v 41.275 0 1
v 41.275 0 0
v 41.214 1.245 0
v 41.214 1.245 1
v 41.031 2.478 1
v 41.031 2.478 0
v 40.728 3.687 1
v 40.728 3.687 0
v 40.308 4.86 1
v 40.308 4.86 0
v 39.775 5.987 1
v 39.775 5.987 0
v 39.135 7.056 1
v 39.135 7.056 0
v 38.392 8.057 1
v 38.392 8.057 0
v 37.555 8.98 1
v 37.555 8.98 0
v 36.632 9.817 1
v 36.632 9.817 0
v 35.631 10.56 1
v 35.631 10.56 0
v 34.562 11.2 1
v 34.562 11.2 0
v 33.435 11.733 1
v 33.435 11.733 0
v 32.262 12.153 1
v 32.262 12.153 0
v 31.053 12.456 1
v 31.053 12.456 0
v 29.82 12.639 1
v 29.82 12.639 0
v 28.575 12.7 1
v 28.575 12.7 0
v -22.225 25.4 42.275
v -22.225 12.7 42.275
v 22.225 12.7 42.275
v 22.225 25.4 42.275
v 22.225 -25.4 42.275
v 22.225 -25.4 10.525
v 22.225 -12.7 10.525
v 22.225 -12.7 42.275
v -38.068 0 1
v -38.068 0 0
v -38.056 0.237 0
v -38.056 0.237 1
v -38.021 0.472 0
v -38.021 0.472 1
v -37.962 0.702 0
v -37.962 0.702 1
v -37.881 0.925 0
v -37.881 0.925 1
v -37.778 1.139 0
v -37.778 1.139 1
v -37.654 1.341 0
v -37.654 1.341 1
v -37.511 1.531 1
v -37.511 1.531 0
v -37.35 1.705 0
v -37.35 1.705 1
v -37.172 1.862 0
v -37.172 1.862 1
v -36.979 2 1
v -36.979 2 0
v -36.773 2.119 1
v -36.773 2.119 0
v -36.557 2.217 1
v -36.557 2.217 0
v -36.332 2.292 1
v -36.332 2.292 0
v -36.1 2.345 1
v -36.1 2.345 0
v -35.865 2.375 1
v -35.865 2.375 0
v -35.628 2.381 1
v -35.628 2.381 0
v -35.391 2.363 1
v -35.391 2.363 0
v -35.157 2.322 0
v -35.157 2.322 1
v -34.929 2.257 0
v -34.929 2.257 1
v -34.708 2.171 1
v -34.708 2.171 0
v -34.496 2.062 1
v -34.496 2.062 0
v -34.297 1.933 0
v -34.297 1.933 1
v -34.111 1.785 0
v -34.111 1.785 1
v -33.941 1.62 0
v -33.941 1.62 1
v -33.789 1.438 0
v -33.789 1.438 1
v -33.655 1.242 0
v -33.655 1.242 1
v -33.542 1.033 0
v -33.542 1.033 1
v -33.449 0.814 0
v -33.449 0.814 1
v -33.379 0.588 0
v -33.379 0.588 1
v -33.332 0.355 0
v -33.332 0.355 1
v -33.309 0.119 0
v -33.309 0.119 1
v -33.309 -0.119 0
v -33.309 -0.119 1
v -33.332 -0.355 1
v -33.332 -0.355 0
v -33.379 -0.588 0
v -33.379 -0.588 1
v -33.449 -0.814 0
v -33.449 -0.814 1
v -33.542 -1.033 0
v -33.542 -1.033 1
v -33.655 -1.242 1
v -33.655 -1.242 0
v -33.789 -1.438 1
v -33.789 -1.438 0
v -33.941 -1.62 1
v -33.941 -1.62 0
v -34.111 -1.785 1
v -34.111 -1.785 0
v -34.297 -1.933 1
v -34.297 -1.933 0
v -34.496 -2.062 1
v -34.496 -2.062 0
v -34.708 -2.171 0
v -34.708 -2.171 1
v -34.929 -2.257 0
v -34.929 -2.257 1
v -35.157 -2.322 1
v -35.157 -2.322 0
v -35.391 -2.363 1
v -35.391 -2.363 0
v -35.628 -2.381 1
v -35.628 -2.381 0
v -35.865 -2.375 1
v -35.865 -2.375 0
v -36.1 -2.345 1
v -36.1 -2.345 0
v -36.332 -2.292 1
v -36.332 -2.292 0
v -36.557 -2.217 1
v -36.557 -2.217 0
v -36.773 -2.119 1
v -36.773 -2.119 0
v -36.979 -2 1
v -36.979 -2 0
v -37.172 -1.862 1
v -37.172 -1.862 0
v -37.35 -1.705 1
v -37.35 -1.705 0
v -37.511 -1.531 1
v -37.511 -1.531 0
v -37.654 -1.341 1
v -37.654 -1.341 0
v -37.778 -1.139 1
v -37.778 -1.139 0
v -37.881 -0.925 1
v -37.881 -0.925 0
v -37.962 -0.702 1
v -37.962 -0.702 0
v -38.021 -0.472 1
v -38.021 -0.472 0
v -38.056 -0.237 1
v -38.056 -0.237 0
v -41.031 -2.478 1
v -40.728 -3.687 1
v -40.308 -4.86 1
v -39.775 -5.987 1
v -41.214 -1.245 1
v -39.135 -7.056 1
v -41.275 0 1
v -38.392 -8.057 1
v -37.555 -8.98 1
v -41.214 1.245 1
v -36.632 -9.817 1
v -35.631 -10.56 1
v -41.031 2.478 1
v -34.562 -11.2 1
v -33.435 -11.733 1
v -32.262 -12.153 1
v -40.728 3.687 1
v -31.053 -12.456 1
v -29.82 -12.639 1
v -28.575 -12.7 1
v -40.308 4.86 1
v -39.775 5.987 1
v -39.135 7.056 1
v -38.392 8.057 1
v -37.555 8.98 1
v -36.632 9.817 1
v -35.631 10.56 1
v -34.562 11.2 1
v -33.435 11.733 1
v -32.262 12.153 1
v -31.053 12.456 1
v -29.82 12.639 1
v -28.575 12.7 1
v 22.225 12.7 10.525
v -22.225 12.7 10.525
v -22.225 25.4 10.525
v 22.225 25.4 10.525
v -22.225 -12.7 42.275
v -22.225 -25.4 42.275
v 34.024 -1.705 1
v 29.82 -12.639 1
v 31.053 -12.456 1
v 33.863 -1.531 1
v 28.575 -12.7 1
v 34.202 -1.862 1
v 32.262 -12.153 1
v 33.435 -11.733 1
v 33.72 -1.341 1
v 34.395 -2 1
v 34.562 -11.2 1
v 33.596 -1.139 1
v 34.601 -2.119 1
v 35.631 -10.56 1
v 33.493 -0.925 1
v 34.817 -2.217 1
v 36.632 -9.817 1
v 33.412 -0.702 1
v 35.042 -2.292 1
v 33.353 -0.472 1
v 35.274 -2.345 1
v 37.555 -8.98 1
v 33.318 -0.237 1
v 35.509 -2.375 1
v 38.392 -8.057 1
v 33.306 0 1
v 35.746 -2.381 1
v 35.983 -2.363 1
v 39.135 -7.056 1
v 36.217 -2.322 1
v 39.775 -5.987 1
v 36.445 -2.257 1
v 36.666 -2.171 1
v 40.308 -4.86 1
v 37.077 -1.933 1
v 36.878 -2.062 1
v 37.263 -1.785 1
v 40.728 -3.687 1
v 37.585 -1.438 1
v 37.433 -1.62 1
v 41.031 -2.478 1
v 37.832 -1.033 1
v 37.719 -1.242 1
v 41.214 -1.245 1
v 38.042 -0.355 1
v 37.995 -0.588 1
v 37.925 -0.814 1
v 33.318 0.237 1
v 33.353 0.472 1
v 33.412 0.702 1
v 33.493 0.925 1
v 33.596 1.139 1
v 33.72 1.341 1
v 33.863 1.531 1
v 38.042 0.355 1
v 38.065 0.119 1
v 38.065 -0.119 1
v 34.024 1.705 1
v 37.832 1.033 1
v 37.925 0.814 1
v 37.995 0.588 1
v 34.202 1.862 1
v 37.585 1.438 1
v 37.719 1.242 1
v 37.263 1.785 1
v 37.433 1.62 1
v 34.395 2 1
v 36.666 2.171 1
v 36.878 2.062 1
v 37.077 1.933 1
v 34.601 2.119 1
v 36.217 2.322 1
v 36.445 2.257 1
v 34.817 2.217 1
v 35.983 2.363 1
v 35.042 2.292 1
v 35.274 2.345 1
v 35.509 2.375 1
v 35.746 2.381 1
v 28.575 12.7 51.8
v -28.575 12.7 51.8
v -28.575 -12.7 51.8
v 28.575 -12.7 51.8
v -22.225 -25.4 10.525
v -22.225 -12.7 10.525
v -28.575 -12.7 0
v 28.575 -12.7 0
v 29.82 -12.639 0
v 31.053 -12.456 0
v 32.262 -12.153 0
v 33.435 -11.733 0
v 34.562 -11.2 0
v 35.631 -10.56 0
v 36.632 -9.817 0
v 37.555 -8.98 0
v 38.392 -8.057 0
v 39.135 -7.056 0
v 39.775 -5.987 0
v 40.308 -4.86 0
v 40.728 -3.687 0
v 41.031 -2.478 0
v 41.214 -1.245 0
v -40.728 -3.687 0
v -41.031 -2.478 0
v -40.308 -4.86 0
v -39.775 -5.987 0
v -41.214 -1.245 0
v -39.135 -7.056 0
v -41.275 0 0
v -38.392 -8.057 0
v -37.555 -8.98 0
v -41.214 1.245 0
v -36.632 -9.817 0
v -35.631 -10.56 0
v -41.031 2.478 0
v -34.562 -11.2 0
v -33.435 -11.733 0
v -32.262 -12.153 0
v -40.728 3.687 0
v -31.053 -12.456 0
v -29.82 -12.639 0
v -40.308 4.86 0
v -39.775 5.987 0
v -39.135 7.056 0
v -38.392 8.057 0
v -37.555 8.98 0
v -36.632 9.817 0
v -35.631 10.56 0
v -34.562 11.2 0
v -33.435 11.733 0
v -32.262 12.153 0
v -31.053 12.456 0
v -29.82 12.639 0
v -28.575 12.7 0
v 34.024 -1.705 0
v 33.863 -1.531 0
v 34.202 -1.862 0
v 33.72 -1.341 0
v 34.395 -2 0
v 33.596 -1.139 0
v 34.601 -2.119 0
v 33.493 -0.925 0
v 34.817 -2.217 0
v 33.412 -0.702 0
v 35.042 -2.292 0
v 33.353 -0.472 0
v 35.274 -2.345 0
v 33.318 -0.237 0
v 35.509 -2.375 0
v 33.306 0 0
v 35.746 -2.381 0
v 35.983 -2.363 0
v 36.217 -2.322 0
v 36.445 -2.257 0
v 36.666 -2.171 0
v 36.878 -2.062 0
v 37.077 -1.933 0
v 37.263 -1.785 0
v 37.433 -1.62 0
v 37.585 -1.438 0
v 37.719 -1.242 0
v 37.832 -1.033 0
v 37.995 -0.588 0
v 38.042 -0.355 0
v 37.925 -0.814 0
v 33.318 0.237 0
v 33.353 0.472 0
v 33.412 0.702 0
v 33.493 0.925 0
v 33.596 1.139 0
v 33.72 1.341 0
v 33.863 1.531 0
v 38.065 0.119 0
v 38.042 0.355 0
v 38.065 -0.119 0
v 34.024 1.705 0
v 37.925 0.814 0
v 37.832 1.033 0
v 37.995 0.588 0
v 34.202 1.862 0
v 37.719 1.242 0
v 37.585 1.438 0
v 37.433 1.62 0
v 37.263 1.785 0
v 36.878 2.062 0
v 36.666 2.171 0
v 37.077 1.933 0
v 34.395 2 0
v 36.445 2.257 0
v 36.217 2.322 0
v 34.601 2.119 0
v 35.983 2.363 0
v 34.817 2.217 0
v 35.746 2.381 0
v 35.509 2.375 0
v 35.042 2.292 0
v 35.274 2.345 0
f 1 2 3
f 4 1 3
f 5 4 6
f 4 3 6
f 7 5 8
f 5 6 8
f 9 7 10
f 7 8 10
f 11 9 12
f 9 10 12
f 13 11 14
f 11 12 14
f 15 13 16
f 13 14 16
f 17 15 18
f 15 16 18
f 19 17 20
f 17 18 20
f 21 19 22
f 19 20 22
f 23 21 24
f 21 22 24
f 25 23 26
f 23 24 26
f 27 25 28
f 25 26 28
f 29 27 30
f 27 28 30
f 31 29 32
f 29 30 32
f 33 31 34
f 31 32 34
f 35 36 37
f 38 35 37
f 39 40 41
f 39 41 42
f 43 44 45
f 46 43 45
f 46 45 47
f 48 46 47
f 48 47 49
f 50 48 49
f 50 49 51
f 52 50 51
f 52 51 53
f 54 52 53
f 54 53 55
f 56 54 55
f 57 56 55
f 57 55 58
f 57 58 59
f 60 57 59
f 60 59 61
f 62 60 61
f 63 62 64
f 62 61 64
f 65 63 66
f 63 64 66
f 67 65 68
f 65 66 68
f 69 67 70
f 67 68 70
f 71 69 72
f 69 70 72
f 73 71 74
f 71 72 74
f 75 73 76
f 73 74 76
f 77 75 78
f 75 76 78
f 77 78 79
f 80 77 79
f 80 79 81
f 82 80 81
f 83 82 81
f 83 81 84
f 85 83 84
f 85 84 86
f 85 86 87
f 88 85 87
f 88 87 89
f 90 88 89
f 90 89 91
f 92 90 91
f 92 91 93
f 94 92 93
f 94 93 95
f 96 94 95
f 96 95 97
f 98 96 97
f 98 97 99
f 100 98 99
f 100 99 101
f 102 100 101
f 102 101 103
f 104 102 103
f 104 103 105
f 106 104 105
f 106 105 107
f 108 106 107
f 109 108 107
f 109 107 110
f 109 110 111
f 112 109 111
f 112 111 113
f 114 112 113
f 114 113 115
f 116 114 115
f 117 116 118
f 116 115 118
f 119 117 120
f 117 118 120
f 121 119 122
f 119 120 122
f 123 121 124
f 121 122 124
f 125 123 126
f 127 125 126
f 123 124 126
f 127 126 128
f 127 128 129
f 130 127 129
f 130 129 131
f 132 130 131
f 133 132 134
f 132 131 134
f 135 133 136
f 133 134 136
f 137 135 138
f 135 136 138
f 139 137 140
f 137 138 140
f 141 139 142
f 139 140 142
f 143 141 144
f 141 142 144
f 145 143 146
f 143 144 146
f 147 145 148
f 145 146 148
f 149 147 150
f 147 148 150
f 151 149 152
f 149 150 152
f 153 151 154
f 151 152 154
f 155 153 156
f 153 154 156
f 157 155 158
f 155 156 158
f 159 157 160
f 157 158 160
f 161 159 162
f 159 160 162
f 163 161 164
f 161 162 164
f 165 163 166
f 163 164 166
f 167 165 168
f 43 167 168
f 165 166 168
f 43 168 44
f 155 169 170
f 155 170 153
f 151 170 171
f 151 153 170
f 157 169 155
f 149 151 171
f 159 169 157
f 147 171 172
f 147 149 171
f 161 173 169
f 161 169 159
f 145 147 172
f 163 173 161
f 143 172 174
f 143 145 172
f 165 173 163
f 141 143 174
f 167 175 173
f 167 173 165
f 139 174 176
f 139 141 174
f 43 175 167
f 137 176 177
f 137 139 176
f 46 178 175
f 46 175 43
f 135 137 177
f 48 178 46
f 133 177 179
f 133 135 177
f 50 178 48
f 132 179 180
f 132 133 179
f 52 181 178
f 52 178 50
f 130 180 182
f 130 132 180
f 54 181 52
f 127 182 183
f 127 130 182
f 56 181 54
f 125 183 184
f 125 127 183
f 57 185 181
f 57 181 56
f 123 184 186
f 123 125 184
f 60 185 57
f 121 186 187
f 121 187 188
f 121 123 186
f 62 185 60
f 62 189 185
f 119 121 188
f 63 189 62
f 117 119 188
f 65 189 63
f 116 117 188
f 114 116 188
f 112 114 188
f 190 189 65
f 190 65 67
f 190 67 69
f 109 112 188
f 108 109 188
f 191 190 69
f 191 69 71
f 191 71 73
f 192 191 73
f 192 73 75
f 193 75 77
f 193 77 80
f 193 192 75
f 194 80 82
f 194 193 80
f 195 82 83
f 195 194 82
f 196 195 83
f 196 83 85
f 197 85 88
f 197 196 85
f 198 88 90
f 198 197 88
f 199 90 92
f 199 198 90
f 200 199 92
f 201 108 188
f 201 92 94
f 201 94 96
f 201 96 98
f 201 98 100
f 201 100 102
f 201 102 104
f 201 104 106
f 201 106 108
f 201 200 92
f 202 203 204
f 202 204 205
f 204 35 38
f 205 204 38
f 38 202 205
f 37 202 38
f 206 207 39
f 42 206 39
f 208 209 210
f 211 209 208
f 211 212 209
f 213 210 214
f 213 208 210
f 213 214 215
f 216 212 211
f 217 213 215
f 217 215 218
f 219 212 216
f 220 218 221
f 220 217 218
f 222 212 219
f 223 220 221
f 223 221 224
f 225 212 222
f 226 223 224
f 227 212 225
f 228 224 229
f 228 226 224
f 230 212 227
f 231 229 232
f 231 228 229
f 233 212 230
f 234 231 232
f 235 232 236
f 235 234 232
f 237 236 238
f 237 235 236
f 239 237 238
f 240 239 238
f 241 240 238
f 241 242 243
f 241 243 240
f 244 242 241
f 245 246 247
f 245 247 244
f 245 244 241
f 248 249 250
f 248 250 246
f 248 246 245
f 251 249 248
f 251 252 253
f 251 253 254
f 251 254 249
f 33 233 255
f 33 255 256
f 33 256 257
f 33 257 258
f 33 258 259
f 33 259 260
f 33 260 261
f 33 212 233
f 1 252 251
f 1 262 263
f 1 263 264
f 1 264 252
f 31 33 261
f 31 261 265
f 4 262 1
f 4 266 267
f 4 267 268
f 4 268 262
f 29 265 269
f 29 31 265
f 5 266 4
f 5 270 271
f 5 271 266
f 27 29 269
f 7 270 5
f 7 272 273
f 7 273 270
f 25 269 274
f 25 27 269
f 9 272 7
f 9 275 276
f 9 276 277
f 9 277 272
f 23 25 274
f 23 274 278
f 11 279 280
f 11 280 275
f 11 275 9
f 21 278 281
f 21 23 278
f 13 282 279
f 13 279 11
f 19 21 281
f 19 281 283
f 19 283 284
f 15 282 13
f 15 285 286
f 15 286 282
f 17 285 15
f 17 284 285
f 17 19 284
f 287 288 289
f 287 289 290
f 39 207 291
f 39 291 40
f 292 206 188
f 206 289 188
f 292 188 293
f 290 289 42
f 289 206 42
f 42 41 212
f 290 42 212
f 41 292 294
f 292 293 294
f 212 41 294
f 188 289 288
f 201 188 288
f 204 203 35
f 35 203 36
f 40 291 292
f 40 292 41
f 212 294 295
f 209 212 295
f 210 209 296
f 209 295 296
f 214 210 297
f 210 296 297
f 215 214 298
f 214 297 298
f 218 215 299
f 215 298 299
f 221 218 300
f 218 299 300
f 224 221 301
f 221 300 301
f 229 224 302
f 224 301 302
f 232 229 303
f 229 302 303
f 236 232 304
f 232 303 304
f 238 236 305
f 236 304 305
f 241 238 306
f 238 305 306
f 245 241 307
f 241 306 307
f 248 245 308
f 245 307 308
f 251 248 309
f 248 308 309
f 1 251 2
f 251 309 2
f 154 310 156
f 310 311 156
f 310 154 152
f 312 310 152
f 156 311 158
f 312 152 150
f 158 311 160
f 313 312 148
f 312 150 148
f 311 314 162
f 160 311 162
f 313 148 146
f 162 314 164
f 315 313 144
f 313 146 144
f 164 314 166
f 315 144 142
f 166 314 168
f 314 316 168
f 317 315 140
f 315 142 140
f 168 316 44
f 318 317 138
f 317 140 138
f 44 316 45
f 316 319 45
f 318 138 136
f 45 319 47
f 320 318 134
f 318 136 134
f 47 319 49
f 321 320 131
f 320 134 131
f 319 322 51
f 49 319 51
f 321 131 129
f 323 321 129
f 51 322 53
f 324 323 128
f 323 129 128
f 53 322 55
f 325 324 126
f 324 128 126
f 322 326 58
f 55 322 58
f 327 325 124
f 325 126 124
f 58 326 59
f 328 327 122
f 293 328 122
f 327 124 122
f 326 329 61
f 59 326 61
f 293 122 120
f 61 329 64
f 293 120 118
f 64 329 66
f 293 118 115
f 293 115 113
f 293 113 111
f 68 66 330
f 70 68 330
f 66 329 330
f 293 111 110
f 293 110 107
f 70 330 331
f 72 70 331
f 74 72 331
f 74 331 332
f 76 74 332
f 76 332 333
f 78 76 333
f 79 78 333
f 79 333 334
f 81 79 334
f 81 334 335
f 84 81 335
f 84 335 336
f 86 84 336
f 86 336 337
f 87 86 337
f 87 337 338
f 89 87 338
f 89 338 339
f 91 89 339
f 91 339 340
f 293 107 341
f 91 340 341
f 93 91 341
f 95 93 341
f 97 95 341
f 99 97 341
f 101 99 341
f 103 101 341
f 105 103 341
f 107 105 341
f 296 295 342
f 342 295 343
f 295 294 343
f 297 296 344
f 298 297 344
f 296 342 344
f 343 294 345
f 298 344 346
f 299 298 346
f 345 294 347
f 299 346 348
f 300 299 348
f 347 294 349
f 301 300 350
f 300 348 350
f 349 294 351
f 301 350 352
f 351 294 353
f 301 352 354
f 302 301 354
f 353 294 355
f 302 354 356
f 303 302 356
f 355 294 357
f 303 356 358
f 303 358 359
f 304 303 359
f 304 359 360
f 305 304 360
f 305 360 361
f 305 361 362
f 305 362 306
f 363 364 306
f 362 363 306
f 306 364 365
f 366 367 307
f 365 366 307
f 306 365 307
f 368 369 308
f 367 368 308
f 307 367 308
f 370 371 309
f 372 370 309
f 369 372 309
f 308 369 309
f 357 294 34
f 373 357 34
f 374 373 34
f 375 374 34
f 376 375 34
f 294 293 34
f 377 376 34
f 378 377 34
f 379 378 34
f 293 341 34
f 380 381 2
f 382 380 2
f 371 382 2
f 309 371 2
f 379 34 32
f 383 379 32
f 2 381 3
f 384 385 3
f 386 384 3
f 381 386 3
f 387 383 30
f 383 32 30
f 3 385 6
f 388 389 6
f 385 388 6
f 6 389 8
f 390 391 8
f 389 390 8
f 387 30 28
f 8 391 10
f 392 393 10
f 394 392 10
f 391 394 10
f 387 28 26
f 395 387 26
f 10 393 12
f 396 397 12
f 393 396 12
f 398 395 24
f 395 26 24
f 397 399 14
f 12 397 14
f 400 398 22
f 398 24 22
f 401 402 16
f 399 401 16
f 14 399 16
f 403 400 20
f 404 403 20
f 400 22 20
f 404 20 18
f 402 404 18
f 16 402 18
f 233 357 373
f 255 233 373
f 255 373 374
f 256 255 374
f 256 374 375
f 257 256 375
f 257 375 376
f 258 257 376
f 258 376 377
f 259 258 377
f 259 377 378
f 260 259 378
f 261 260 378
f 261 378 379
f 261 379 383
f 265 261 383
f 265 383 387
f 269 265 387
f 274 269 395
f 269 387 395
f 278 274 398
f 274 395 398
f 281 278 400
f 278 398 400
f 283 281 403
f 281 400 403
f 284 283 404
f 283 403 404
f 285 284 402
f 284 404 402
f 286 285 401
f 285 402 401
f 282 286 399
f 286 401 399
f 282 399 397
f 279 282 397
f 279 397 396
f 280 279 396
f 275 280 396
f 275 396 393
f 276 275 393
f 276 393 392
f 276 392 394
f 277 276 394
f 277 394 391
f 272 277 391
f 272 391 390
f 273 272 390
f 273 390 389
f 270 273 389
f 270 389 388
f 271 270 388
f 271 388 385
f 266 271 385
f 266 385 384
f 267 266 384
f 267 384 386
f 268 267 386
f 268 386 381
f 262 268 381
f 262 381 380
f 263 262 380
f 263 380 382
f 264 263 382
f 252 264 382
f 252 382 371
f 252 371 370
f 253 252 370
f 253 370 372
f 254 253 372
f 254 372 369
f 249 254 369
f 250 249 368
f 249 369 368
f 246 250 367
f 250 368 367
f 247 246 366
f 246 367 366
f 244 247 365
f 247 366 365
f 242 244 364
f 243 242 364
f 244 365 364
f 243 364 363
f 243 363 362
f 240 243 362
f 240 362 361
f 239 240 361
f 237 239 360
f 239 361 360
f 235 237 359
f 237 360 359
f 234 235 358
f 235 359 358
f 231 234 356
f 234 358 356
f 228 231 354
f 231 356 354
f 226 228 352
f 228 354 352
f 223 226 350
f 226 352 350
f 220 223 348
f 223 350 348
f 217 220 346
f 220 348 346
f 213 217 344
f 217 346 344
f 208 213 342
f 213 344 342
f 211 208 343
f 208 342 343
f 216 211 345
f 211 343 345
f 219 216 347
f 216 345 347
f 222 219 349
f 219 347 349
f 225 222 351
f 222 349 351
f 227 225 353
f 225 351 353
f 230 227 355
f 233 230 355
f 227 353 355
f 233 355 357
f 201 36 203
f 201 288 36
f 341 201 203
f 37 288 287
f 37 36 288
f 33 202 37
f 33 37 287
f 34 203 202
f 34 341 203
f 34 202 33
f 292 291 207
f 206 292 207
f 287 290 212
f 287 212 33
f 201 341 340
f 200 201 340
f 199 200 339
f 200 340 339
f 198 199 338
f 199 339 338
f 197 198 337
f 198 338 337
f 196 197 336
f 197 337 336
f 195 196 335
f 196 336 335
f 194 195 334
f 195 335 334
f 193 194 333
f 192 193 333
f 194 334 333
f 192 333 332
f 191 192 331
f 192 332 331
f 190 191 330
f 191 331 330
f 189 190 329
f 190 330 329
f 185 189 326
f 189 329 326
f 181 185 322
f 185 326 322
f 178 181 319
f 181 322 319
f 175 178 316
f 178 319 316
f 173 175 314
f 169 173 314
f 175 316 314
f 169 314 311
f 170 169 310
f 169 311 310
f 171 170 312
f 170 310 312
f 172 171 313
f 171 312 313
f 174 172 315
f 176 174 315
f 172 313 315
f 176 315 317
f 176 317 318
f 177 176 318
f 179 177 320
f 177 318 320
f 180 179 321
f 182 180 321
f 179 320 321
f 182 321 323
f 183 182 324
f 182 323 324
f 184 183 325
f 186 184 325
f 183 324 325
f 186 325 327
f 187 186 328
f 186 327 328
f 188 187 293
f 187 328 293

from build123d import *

# Parameters (mm, degrees)
F1_DEPTH = 1
F3_D     = 4.7625
F4_W     = 57.15
F4_H     = 25.4
F5_DEPTH = 50.8
F6_W     = 44.45
F6_H     = 31.75
F7_DEPTH = 25.4


with BuildPart() as f1:
    # F0 (on Top) → F1 (new body)
    with BuildSketch(Plane.XY):
        with BuildLine():
            ThreePointArc((-28.575, 12.7), (-41.275, 0), (-28.575, -12.7))
            Line((-28.575, -12.7), (-28.575, 12.7))
        make_face()
        with BuildLine():
            Line((-28.575, 12.7), (-28.575, -12.7))
            ThreePointArc((-28.575, -12.7), (-19.594744, -8.980256), (-15.875, 0))
            ThreePointArc((-15.875, 0), (-19.594744, 8.980256), (-28.575, 12.7))
        make_face()
        with BuildLine():
            ThreePointArc((-15.875, 0), (-19.594744, -8.980256), (-28.575, -12.7))
            Line((-28.575, -12.7), (28.575, -12.7))
            ThreePointArc((28.575, -12.7), (15.875, 0), (28.575, 12.7))
            Line((28.575, 12.7), (-28.575, 12.7))
            ThreePointArc((-28.575, 12.7), (-19.594744, 8.980256), (-15.875, 0))
        make_face()
        with BuildLine():
            ThreePointArc((28.575, 12.7), (15.875, 0), (28.575, -12.7))
            Line((28.575, -12.7), (28.575, 12.7))
        make_face()
        with BuildLine():
            Line((28.575, 12.7), (28.575, -12.7))
            ThreePointArc((28.575, -12.7), (37.555256, -8.980256), (41.275, 0))
            ThreePointArc((41.275, 0), (37.555256, 8.980256), (28.575, 12.7))
        make_face()
    extrude(amount=F1_DEPTH)

    # F3 (through all)
    with Locations(Plane.XY.offset(1)):
        with Locations((-35.687, 0), (35.687, 0)):
            Hole(F3_D / 2)

    # F4 (on face) → F5 (join)
    with BuildSketch(Plane.XY.offset(1)):
        Rectangle(F4_W, F4_H)
    extrude(amount=F5_DEPTH)

    # F6 (on Front) → F7 (join, symmetric)
    with BuildSketch(Plane.XZ):
        with Locations((0, 26.4)):
            Rectangle(F6_W, F6_H)
    extrude(amount=F7_DEPTH, both=True)


solid = f1.part
